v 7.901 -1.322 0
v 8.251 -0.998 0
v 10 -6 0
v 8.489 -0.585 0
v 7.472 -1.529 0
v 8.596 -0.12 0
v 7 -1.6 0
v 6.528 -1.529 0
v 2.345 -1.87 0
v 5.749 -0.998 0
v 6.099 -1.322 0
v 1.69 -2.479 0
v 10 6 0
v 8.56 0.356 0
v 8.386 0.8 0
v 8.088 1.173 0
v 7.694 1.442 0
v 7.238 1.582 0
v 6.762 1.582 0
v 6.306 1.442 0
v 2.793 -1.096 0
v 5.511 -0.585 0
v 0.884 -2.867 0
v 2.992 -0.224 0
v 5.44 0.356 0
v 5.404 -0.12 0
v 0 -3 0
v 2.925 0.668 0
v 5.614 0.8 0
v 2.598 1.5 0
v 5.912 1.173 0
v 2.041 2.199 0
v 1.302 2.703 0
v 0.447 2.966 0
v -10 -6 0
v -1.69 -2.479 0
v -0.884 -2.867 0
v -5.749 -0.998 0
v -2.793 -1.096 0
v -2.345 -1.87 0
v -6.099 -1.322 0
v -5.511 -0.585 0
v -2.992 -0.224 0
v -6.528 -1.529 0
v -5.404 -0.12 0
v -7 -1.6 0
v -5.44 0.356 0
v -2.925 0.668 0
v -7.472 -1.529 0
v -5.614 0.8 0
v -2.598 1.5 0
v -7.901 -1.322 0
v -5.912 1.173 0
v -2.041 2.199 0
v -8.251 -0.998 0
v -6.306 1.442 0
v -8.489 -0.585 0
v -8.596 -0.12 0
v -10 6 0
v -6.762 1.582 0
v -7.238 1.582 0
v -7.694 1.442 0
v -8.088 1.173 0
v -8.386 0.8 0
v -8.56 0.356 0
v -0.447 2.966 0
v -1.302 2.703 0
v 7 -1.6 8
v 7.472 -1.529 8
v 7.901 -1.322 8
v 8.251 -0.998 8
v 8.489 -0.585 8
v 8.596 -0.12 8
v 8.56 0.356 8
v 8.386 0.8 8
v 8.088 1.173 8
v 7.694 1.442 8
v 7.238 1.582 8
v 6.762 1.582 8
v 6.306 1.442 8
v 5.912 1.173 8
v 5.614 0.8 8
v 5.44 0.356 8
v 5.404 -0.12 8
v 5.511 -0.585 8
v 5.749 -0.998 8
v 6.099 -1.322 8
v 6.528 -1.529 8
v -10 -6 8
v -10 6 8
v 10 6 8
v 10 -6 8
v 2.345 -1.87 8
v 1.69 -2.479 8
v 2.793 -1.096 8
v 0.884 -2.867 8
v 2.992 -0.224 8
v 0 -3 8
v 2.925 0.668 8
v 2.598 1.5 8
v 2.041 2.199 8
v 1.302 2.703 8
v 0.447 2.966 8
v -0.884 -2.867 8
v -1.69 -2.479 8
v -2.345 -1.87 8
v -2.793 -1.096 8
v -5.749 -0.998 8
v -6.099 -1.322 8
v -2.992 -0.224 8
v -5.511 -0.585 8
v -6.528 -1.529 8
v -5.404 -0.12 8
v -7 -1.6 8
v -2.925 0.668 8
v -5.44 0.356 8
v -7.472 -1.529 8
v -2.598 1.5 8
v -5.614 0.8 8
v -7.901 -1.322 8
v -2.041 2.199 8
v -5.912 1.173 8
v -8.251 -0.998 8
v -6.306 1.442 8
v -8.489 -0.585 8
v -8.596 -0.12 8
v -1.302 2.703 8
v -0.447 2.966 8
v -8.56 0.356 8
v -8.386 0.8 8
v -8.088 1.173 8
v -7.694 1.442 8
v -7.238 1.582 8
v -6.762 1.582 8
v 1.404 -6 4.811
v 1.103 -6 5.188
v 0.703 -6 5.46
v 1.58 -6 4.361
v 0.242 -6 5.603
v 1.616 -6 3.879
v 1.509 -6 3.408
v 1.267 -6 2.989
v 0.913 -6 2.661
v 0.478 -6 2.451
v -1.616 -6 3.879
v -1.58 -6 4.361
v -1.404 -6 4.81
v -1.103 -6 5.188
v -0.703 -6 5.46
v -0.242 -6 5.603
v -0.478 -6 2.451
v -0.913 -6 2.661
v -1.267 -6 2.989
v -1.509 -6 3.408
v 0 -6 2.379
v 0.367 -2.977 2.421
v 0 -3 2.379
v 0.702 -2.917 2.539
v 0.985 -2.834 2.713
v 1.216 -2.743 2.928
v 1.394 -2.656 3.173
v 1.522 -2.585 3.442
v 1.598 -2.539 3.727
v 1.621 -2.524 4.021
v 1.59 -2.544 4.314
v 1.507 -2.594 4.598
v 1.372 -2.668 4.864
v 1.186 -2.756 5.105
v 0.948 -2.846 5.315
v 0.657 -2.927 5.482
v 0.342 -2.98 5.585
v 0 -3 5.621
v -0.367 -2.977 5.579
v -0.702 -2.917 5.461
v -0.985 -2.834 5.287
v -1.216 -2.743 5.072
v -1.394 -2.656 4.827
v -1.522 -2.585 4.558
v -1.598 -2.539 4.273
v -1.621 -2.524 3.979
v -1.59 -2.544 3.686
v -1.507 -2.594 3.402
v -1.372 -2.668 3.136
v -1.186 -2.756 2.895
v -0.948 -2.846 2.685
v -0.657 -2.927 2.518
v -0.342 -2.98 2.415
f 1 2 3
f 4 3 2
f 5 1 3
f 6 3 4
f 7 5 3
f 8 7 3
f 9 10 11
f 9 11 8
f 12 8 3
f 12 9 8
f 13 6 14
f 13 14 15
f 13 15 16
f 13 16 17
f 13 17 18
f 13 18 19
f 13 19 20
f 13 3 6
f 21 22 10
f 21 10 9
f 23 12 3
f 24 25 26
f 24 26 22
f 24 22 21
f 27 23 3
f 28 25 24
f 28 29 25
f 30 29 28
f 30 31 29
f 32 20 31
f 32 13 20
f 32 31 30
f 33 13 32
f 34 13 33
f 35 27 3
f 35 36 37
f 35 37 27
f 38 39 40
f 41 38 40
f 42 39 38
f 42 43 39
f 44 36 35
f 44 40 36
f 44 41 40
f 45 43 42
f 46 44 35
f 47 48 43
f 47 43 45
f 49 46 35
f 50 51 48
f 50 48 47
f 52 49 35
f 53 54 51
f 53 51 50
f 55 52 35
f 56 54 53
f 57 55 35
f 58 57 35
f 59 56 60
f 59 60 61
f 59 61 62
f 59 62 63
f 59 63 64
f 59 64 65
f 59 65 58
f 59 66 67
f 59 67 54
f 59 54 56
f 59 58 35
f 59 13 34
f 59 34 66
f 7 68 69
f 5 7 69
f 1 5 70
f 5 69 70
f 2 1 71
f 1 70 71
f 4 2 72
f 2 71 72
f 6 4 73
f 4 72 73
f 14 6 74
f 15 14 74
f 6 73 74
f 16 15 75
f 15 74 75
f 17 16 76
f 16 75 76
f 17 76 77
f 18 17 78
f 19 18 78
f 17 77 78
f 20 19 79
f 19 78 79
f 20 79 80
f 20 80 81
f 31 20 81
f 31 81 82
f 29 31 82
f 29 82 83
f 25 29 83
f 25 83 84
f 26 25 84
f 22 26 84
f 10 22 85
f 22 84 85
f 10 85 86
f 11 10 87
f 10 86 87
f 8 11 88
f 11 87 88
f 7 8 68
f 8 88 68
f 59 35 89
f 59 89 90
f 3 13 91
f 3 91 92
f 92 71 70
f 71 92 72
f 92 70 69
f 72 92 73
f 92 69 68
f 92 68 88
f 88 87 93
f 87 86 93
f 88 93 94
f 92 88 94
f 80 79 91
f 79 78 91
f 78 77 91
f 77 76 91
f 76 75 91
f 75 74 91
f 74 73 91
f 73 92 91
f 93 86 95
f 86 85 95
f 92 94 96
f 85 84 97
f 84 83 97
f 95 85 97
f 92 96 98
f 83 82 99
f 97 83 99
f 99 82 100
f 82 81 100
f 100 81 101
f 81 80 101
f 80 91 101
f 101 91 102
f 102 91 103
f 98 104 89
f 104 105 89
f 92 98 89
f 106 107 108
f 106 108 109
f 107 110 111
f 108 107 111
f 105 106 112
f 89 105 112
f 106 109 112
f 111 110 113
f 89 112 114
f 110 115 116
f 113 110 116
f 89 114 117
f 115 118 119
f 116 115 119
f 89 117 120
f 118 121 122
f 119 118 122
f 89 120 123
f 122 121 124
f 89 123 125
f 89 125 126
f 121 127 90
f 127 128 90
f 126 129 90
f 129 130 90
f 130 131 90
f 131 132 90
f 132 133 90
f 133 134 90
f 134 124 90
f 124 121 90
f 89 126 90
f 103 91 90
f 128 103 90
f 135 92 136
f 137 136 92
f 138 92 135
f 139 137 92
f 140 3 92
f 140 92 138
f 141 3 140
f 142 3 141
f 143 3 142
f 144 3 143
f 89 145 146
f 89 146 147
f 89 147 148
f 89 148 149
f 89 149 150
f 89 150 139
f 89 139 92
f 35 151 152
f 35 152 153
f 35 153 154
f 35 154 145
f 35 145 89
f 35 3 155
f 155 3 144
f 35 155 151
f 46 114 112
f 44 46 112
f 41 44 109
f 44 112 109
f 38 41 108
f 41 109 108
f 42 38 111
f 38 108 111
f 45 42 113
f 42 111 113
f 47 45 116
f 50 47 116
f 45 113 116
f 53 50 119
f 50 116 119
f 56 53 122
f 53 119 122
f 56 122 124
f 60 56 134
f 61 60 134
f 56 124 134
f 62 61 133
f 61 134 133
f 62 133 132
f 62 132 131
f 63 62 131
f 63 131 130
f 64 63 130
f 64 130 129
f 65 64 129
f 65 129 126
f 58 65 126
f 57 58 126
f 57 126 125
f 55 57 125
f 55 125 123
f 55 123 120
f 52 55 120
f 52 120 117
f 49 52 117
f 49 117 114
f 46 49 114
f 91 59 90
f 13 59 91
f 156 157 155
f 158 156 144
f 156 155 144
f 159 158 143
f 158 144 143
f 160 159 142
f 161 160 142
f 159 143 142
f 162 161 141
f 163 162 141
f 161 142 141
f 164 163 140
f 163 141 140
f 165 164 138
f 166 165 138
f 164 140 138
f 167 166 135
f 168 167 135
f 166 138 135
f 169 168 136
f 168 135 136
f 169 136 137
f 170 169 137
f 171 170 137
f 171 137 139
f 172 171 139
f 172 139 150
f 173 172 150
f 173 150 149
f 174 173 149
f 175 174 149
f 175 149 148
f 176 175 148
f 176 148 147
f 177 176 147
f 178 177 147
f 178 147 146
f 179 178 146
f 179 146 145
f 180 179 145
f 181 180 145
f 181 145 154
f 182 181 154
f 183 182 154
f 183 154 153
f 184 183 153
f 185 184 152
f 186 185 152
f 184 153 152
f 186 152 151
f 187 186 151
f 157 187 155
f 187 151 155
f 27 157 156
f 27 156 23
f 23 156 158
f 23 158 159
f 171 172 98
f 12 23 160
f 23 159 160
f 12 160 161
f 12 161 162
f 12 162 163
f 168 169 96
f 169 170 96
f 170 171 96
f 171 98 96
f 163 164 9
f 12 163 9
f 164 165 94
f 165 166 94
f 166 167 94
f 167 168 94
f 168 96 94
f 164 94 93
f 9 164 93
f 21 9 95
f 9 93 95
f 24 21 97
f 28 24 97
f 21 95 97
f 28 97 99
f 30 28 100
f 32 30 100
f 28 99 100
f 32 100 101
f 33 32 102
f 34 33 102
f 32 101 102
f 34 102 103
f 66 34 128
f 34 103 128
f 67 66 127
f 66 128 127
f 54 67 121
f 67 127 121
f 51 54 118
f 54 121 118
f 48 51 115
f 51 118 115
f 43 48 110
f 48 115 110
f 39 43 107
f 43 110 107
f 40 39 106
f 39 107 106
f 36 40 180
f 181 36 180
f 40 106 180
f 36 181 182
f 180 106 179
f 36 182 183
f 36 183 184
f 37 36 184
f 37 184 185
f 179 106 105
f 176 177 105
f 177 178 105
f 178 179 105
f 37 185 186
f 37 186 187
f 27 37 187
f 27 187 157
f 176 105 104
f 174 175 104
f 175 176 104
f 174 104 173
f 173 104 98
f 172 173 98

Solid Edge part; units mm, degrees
sketch "Sketch1" plane through (0, 0, 0) normal (0, 0, 1) x (1, 0, 0)
  line L0 (10, -6) -> (-10, -6)
  line L1 (-10, -6) -> (-10, 6)
  line L2 (-10, 6) -> (10, 6)
  line L3 (10, 6) -> (10, -6)
  dimension "D1" = 20
  dimension "D2" = 12
extrude "Protrusion1" add sketch "Sketch1" along normal blind 8
hole "Hole_1" at (0, 0, 8) direction (0, 0, -1) diameter 6 end up to next
hole "Hole_2" at (-7, 0, 8) direction (0, 0, -1) diameter 3.2 end up to next
hole "Hole1" at (7, 0, 8) direction (0, 0, -1) diameter 3.2 end up to next
hole "Hole_4" at (0, -6, 4) direction (0, 1, 0) diameter 3.242 end up to next thread major 4 thread length 2
hole "Hole2" [suppressed]
